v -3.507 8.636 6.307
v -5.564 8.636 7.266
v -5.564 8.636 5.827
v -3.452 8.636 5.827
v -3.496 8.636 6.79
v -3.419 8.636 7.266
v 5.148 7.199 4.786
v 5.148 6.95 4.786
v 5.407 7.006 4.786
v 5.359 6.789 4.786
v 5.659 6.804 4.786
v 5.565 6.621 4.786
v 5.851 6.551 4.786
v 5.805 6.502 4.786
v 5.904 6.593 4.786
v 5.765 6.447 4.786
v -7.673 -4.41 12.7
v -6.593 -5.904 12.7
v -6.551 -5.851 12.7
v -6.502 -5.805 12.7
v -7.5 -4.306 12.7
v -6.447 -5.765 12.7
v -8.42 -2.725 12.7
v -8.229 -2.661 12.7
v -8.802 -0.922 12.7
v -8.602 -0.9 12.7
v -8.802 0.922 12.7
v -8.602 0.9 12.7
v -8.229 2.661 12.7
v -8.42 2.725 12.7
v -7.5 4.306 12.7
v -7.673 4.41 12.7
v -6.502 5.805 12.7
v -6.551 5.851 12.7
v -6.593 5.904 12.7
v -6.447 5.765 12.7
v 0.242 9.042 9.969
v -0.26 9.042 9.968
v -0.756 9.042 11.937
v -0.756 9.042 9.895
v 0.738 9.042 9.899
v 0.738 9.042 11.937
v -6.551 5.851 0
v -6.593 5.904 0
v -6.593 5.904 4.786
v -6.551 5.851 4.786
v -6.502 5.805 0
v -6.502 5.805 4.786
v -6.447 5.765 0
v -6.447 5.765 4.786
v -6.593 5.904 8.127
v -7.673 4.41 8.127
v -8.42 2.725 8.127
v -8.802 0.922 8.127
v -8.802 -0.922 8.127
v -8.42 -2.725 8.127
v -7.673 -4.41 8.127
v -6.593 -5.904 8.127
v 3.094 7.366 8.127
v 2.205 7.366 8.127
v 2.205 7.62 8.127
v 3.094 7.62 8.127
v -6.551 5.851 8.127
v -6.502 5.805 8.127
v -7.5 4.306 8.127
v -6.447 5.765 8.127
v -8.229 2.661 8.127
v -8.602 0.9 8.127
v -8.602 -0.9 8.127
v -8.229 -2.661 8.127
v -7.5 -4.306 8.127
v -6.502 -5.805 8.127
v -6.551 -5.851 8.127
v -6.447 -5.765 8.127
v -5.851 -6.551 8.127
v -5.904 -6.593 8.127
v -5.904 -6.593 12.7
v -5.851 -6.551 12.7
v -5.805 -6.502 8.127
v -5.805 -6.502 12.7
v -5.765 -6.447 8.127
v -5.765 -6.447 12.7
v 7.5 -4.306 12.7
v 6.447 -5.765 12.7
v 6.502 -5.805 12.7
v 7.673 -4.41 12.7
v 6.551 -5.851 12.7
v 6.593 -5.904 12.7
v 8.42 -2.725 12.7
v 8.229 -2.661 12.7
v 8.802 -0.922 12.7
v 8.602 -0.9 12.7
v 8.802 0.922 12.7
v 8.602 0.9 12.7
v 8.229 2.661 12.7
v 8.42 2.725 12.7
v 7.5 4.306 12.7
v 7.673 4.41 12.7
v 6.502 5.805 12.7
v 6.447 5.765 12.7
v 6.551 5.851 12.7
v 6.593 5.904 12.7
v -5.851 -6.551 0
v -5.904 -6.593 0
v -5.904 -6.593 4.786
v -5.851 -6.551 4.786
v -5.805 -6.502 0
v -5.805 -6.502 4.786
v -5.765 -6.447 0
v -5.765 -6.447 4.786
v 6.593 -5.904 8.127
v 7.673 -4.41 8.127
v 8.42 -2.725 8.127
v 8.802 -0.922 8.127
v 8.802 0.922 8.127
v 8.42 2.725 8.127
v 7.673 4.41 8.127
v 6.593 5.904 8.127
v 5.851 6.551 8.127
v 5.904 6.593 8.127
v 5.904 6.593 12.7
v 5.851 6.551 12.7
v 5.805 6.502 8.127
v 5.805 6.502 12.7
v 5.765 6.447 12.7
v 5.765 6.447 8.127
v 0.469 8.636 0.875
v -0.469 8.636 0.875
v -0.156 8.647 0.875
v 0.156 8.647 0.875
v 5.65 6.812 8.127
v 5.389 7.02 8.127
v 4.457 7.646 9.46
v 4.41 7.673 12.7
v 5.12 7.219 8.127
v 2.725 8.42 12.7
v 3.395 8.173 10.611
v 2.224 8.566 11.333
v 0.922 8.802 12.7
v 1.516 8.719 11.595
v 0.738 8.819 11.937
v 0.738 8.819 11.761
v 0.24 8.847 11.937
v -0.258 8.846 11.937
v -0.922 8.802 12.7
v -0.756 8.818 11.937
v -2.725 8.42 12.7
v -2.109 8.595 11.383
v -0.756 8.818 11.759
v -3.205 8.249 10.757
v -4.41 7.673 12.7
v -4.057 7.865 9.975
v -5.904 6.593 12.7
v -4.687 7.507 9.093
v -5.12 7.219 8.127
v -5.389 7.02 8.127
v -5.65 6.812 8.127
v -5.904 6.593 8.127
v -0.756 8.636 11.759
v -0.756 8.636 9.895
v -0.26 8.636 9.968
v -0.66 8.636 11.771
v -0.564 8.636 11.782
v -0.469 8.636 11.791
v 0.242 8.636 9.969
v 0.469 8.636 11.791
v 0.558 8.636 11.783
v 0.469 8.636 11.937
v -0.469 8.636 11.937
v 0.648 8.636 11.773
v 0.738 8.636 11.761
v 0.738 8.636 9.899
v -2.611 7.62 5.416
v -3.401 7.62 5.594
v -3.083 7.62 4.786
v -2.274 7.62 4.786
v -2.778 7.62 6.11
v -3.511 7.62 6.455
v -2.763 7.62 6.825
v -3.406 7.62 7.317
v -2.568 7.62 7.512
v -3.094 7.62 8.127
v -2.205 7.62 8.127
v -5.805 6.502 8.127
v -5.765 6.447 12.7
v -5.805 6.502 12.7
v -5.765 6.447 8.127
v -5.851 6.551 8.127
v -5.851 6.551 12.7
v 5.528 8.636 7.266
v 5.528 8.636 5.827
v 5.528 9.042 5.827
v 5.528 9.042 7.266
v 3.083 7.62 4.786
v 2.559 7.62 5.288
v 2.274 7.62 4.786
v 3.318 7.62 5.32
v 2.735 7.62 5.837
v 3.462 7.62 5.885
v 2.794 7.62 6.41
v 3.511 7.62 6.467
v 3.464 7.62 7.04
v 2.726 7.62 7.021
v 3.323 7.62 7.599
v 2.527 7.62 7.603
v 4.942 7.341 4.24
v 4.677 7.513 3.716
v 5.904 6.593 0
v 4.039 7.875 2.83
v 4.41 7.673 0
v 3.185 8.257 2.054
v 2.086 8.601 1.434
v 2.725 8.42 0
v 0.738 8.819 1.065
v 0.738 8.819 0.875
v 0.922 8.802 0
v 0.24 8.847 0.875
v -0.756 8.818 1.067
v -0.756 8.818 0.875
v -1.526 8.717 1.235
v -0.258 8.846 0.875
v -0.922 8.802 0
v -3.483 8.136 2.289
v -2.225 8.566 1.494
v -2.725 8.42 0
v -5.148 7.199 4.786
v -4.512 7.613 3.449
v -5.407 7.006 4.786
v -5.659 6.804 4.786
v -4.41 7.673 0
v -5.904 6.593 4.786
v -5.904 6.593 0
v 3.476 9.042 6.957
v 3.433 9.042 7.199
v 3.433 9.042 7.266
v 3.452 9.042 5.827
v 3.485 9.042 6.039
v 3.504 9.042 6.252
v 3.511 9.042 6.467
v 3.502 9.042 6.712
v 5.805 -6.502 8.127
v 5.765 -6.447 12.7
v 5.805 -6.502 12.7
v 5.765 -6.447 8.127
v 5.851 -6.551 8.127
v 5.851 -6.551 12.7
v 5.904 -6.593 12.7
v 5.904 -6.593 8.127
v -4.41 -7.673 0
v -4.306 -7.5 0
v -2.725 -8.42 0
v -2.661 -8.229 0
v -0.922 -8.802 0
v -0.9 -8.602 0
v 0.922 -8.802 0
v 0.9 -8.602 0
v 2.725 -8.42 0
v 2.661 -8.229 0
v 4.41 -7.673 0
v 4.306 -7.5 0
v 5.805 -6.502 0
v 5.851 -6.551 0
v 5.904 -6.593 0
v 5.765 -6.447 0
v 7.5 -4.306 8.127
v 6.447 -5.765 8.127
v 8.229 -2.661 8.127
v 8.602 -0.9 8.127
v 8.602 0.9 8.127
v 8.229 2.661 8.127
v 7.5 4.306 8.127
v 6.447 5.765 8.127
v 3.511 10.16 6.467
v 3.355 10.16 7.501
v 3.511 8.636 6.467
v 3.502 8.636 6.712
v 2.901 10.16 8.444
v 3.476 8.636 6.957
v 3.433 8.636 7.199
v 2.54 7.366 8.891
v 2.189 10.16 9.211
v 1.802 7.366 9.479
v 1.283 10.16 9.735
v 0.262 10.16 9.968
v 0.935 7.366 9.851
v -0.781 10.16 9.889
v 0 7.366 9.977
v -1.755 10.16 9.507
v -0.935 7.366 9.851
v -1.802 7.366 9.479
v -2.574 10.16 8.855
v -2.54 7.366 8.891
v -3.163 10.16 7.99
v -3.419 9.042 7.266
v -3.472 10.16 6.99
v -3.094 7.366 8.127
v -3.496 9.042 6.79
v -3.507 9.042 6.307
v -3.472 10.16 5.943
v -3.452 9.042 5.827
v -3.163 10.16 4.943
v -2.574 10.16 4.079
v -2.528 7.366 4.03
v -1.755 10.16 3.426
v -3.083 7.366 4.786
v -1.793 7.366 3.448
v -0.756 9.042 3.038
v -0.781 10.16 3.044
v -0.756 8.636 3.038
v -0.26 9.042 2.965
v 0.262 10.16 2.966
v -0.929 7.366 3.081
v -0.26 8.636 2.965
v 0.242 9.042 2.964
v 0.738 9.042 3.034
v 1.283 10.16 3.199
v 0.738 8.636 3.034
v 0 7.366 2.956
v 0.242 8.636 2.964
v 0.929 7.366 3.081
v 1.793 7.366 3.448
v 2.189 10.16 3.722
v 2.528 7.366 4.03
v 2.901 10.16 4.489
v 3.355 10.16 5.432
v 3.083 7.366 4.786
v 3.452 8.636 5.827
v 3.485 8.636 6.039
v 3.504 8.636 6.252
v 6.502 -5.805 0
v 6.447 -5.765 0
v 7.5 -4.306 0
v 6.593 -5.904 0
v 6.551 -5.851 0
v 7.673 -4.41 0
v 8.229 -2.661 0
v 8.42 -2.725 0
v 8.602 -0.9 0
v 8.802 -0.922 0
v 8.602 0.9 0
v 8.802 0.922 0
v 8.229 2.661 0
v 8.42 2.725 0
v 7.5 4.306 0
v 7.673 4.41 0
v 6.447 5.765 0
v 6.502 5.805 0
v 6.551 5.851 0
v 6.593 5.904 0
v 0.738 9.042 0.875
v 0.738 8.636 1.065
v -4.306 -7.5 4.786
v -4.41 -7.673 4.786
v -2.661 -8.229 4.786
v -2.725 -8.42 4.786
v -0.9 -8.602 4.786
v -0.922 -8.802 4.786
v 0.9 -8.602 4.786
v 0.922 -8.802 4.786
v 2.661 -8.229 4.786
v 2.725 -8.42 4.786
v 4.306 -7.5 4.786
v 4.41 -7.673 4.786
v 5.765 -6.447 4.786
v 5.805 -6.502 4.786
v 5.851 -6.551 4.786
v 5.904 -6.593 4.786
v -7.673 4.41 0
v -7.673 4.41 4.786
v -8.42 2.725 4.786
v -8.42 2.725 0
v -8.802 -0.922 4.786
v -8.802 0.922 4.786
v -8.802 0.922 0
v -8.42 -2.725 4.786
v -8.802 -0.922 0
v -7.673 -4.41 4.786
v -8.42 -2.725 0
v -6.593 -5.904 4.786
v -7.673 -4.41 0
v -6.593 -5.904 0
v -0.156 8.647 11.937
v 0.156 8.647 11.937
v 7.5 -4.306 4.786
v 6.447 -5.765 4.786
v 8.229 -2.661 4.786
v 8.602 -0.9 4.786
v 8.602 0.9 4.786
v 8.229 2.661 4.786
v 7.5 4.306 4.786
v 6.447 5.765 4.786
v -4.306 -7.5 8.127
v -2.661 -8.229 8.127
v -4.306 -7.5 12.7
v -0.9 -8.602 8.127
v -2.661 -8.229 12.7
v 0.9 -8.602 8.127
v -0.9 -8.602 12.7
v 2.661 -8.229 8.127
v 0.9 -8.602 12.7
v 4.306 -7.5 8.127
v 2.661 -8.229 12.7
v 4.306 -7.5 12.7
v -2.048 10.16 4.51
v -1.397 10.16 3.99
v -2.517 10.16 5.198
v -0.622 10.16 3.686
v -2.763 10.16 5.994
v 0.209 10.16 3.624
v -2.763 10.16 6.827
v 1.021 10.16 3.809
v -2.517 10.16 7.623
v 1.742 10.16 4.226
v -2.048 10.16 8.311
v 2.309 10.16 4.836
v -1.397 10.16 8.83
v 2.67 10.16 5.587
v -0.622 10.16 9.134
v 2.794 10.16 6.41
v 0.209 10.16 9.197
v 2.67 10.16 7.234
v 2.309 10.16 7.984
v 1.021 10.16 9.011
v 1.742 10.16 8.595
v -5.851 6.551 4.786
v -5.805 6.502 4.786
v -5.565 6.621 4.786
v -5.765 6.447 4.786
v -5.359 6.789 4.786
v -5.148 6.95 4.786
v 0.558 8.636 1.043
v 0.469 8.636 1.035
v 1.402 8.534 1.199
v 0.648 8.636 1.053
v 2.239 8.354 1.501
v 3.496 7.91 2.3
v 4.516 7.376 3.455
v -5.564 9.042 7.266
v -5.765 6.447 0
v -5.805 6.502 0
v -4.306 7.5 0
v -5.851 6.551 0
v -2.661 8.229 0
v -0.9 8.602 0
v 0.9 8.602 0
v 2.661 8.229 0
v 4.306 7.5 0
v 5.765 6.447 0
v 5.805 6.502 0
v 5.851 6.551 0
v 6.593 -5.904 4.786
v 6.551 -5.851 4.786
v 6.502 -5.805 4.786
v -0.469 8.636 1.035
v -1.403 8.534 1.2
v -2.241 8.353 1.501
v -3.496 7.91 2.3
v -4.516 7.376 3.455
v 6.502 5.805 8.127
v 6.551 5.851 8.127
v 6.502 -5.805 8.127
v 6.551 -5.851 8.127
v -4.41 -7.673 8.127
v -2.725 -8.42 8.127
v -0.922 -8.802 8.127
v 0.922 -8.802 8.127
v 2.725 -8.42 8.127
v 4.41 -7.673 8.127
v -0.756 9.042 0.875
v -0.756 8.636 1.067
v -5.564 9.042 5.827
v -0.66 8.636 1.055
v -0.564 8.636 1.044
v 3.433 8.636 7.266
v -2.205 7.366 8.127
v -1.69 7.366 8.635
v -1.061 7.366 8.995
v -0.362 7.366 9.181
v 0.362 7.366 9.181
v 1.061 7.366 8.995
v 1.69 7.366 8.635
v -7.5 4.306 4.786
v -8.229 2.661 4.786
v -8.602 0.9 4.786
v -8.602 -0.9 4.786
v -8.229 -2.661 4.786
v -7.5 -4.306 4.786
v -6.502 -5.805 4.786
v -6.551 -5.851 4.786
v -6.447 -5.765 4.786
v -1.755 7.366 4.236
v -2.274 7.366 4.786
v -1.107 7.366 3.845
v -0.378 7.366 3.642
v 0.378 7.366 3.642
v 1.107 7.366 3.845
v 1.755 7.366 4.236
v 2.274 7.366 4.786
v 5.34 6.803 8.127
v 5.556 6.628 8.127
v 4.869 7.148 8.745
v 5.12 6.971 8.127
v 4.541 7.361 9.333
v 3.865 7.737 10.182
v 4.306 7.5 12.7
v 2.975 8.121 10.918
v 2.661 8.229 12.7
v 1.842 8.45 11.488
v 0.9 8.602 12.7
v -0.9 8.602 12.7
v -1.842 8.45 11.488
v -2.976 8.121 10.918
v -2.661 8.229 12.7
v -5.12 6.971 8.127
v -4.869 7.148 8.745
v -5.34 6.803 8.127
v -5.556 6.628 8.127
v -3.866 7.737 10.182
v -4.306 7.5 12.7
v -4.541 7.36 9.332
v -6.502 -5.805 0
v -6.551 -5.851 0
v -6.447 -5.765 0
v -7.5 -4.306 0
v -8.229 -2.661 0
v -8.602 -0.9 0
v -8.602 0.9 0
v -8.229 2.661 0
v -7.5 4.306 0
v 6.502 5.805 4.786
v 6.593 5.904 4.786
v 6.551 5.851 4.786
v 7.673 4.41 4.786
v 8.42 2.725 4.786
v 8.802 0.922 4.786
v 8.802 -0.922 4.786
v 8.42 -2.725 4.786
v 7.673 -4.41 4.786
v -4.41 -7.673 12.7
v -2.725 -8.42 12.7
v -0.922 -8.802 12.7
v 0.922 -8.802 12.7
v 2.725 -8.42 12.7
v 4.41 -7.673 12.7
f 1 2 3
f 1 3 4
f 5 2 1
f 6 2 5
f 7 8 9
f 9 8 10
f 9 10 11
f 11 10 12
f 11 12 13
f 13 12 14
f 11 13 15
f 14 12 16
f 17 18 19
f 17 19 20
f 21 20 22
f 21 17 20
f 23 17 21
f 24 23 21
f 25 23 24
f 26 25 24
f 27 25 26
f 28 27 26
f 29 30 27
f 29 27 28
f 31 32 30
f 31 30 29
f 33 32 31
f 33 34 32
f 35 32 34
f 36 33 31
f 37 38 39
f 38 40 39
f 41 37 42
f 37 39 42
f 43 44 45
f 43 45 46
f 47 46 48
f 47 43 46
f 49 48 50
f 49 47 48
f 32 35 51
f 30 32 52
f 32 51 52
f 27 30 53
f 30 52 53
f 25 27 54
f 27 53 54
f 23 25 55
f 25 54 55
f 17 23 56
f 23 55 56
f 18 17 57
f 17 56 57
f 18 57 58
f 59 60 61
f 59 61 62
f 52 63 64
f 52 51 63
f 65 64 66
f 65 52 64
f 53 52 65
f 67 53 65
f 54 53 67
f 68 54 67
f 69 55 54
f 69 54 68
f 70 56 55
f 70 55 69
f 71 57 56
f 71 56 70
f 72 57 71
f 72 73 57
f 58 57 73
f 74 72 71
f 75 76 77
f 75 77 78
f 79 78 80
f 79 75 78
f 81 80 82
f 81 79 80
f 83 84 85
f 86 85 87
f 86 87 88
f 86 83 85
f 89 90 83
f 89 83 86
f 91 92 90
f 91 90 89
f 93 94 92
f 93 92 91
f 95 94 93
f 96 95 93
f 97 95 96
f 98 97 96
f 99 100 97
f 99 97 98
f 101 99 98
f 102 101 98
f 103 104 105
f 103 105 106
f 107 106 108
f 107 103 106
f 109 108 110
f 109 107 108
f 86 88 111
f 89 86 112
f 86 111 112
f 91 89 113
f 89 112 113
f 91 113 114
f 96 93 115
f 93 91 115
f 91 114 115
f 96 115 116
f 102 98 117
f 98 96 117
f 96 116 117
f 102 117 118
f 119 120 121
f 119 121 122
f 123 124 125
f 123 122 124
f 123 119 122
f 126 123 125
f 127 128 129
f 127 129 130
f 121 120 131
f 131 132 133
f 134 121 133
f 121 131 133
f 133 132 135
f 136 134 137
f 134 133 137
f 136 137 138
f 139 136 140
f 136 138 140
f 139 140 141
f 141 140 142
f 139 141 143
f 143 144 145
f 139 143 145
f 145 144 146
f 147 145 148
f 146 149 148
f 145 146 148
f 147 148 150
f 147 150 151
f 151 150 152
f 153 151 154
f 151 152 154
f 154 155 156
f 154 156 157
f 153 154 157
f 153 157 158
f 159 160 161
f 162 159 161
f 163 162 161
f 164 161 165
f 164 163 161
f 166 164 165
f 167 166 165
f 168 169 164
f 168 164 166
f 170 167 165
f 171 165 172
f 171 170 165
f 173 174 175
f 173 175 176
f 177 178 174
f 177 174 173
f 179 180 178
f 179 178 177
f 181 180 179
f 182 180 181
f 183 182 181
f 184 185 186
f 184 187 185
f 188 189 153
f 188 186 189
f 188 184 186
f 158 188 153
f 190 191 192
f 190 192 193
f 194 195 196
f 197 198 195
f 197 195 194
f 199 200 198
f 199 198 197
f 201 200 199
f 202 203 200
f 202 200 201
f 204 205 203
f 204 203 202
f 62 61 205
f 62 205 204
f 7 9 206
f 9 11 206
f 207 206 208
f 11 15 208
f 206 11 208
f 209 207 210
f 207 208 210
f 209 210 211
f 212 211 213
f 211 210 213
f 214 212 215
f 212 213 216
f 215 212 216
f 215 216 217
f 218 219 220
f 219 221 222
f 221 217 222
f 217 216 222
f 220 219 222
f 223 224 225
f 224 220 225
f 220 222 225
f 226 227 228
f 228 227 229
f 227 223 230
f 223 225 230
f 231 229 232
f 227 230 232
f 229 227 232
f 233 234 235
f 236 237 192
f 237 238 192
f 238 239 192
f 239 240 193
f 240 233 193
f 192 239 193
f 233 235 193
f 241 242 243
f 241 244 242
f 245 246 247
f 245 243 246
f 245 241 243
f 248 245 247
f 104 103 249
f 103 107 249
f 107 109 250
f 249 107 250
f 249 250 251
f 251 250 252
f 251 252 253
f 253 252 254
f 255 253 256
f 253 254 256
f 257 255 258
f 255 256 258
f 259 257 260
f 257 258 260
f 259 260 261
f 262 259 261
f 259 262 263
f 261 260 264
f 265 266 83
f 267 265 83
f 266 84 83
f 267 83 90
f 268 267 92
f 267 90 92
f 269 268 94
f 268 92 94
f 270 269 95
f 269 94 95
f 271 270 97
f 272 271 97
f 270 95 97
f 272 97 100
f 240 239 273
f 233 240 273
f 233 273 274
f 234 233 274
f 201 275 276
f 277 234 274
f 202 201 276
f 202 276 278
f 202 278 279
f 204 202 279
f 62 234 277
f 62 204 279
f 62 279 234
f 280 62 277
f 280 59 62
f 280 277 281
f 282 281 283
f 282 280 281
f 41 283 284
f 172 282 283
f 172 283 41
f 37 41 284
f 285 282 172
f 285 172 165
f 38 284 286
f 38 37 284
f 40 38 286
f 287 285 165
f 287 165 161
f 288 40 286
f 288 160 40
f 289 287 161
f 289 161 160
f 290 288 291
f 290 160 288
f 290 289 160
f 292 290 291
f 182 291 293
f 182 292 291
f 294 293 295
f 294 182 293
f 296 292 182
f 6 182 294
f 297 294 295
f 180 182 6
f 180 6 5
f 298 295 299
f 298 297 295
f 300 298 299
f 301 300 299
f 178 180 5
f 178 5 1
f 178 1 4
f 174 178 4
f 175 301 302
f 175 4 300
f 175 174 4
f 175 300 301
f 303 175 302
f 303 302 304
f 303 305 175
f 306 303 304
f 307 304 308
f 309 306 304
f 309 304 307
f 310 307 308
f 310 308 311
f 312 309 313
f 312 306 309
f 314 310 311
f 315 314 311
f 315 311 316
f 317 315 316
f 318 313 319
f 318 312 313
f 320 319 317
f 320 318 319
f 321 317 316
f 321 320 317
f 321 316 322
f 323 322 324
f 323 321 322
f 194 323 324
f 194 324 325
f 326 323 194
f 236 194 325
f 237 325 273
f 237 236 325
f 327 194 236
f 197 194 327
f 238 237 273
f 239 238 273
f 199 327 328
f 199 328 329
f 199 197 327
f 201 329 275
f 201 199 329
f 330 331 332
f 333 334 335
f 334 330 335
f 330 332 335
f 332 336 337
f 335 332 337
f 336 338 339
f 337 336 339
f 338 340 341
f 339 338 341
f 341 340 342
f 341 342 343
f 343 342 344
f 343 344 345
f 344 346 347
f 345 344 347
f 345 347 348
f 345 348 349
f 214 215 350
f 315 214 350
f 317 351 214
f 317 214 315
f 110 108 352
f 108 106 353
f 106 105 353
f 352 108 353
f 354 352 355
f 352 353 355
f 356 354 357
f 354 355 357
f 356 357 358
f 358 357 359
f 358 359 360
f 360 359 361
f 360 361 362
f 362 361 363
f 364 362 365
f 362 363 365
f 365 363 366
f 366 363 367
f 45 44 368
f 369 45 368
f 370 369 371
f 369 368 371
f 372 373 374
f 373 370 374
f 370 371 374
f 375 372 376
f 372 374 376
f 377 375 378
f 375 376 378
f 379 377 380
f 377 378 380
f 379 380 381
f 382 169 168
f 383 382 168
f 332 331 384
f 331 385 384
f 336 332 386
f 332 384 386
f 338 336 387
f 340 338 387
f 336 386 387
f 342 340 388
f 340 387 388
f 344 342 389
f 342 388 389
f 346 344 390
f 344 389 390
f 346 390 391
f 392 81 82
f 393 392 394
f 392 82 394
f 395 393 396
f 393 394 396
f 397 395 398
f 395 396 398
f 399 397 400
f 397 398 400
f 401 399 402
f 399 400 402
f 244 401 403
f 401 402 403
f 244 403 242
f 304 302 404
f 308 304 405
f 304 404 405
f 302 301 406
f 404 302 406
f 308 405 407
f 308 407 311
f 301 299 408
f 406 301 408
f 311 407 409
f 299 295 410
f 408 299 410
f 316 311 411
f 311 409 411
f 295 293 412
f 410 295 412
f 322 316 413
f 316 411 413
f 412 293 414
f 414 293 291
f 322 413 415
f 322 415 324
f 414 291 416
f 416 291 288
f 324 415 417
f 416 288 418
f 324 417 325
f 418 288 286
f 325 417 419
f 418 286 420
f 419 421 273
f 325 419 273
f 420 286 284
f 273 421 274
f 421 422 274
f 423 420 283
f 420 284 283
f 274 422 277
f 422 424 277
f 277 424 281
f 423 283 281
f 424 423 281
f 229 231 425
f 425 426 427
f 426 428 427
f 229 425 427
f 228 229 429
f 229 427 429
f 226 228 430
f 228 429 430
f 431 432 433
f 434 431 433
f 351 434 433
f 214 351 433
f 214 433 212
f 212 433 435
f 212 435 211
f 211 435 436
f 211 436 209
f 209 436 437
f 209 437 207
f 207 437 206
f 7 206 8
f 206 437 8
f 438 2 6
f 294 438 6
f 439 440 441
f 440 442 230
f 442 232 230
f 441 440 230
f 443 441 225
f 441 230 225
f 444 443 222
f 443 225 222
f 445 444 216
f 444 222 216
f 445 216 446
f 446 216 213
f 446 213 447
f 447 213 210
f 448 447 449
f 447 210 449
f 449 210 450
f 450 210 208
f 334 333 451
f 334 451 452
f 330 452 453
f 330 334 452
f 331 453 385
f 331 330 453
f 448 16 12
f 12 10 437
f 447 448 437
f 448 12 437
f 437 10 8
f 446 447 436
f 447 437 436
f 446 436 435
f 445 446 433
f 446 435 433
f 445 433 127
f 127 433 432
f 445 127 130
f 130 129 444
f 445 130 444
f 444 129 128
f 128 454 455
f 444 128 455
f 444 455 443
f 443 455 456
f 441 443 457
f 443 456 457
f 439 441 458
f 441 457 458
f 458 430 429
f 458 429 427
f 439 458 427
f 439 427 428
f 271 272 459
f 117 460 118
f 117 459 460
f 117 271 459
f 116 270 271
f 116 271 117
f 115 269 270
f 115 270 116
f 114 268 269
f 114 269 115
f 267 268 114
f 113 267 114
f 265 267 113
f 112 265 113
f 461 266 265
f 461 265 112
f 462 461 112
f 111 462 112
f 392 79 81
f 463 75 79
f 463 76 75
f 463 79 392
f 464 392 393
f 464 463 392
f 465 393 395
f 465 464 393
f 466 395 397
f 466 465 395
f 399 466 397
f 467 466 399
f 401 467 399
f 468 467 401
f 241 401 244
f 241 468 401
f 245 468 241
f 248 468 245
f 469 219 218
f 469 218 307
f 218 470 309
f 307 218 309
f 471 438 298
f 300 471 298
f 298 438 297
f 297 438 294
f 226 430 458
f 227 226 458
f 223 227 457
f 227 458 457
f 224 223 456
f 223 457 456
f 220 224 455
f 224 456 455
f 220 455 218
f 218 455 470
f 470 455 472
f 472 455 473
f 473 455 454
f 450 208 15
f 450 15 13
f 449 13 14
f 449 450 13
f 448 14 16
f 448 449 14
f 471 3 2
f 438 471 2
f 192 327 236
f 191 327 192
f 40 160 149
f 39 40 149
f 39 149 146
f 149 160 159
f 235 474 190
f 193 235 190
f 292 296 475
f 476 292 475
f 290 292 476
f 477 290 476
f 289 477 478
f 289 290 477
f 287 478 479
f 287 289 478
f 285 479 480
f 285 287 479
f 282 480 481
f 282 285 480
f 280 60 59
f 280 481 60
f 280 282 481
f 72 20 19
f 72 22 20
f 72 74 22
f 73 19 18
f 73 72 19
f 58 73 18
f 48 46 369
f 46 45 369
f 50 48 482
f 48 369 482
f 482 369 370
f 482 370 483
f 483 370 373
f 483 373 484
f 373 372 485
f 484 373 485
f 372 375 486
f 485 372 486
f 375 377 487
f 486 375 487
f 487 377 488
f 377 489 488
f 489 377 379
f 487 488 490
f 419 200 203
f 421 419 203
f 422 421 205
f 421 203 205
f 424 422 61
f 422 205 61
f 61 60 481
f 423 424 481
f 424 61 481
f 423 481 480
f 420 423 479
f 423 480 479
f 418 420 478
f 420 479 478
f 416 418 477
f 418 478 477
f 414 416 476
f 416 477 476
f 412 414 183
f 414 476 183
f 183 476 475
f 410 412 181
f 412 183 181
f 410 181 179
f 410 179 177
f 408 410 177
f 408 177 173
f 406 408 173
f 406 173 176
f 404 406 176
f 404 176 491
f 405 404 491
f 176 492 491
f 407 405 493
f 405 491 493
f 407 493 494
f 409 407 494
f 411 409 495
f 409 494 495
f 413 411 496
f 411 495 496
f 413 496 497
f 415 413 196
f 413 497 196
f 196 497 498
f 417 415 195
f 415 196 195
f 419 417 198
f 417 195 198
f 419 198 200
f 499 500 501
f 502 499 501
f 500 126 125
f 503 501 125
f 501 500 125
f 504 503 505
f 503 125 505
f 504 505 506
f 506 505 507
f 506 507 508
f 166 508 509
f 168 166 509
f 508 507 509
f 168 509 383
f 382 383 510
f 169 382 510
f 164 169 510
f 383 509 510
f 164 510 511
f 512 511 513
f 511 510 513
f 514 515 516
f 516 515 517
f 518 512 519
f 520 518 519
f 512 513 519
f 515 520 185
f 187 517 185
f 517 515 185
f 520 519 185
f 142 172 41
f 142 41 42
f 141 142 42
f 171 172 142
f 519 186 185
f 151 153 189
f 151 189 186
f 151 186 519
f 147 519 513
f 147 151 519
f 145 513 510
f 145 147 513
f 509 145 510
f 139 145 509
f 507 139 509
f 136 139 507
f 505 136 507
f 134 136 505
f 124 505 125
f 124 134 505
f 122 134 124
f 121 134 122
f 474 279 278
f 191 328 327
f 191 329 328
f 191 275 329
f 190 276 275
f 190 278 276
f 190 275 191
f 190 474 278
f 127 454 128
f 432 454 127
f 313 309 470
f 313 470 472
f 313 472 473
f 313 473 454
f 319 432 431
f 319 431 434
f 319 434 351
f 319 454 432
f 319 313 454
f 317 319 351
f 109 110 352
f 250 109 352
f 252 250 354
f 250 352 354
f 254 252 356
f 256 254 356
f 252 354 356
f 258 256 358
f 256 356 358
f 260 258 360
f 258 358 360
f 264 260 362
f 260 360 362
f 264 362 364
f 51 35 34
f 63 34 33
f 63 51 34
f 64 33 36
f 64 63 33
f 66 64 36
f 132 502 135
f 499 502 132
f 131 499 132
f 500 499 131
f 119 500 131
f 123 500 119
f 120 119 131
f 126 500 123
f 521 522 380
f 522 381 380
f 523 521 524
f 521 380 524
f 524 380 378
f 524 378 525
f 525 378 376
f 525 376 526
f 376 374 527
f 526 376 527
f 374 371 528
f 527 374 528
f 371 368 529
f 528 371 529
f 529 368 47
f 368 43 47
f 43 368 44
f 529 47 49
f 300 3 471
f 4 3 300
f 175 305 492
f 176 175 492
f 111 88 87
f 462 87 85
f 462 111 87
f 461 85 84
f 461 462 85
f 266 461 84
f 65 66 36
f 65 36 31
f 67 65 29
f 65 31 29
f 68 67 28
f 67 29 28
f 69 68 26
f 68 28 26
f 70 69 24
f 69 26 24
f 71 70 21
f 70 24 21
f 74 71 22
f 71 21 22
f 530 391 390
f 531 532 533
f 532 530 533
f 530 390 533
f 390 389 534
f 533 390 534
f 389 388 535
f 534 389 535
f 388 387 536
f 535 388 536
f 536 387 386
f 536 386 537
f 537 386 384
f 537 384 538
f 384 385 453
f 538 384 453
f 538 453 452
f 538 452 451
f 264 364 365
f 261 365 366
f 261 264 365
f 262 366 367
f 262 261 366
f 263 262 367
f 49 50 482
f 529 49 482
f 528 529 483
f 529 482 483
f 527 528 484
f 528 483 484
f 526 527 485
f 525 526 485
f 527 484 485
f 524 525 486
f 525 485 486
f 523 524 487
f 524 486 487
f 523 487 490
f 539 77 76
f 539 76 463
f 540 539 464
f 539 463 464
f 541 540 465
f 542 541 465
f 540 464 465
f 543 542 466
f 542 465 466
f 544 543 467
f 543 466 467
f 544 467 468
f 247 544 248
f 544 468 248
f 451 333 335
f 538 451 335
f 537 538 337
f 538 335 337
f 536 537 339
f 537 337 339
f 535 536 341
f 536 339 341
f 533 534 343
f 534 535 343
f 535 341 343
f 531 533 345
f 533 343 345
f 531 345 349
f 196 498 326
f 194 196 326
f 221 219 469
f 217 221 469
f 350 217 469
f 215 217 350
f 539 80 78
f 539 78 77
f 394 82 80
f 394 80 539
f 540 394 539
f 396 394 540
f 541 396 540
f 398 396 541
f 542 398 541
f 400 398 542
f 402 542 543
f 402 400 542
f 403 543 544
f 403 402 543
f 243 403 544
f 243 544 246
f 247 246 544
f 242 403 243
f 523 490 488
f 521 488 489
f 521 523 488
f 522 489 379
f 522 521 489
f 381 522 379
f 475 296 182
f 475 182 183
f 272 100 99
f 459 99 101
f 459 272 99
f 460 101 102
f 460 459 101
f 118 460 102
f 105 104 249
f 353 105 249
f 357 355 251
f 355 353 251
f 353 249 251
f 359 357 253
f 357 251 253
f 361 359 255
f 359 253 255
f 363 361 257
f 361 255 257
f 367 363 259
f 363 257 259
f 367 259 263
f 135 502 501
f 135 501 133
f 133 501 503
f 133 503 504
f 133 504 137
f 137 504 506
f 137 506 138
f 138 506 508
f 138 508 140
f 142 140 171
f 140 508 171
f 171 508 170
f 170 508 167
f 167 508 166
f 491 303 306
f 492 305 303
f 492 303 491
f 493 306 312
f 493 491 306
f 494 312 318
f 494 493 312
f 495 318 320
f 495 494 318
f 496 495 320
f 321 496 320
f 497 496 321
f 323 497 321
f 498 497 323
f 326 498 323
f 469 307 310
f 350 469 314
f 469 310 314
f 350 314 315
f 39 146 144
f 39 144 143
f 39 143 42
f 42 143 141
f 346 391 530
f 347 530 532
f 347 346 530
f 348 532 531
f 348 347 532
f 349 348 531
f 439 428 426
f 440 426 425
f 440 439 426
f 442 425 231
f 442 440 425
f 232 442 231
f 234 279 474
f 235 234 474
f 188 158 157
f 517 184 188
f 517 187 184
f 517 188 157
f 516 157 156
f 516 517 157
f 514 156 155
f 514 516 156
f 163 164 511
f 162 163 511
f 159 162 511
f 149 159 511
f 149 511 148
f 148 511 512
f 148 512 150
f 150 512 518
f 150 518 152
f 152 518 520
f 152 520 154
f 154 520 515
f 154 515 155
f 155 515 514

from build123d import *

# Parameters (mm, degrees)
F0_R           = 8.85
F1_DEPTH       = 12.7
F2_R           = 8.6487
F3_DEPTH       = 25.4
F4_R           = 5.3987446143
F5_DEPTH       = 25.4
F7_START       = -8.636
F6_W           = 2.0945777651
F6_H           = 1.4388835989
F7_DEPTH       = 0.4064
F6_W_2         = 2.2767148912
F6_W_3         = 1.4935249928
F6_H_2         = 2.1205339581
F6_H_3         = 2.2797814454
F9_START       = -7.366
F8_R           = 3.5108101387
F9_DEPTH       = 2.794
F10_R          = 2.7941375303
F11_DEPTH      = 10.16
F12_W          = 28.4602986649
F12_H          = 3.3404105343
F13_DEPTH      = 25.4
F13_DEPTH_BACK = 7.62
F14_R          = 0.4953
F15_DEPTH      = 40.132


with BuildPart() as f1:
    # F0 (on Top) → F1 (new body)
    with BuildSketch(Plane.XY):
        Circle(F0_R)
    extrude(amount=F1_DEPTH)

    # F2 (on face) → F3 (cut)
    with BuildSketch(Plane.XY.offset(12.7)):
        Circle(F2_R)
    extrude(amount=-F3_DEPTH, mode=Mode.SUBTRACT)

    # F4 (on Front) → F5 (cut)
    with BuildSketch(Plane.XZ):
        with Locations((0, 6.4130760729)):
            Circle(F4_R)
    extrude(amount=-F5_DEPTH, mode=Mode.SUBTRACT)

    # F6 (on Front) → F7, piece 3 (join)
    with BuildSketch(Plane.XZ.offset(F7_START)):
        with Locations((-0.0089060632, 10.8763854951)):
            Rectangle(F6_W_3, F6_H_2)
        with Locations((-0.0089060632, 2.0152161887)):
            Rectangle(F6_W_3, F6_H_3)
    extrude(amount=-F7_DEPTH)



with BuildPart() as f7:
    # F6 (on Front) → F7 (new body)
    with BuildSketch(Plane.XZ.offset(F7_START)):
        with Locations((4.4807755621, 6.5467560198)):
            Rectangle(F6_W, F6_H)
    extrude(amount=-F7_DEPTH)


with BuildPart() as f7b:
    # F6 (on Front) → F7, piece 2 (new body)
    with BuildSketch(Plane.XZ.offset(F7_START)):
        with Locations((-4.4257324189, 6.5467560198)):
            Rectangle(F6_W_2, F6_H)
    extrude(amount=-F7_DEPTH)


with BuildPart() as f1_1:
    add(f1.part)

    add(f7.part)  # F9 merges F7

    add(f7b.part)  # F9 merges F7b
    # F8 (on Front) → F9 (join)
    with BuildSketch(Plane.XZ.offset(F9_START)):
        with Locations((0, 6.4666298567)):
            Circle(F8_R)
    extrude(amount=-F9_DEPTH)

    # F10 (on Front) → F11 (cut, through all)
    with BuildSketch(Plane.XZ):
        with Locations((0, 6.410241127)):
            Circle(F10_R)
    extrude(amount=-F11_DEPTH, mode=Mode.SUBTRACT)

    # F12 (on Front) → F13 (cut, two sides)
    with BuildSketch(Plane.XZ) as f13_sk:
        with Locations((-0.3436258994, 6.4565266948)):
            Rectangle(F12_W, F12_H)
    extrude(amount=F13_DEPTH, mode=Mode.SUBTRACT)
    extrude(f13_sk.sketch, amount=-F13_DEPTH_BACK, mode=Mode.SUBTRACT)

    # F14 (on Top) → F15 (cut)
    with BuildSketch(Plane.XY):
        with Locations((6.186724716, 6.186724716)):
            Circle(F14_R)
        with Locations((6.186724716, -6.186724716)):
            Circle(F14_R)
        with Locations((-6.186724716, -6.186724716)):
            Circle(F14_R)
        with Locations((-6.186724716, 6.186724716)):
            Circle(F14_R)
    extrude(amount=F15_DEPTH, mode=Mode.SUBTRACT)


solid = f1_1.part
